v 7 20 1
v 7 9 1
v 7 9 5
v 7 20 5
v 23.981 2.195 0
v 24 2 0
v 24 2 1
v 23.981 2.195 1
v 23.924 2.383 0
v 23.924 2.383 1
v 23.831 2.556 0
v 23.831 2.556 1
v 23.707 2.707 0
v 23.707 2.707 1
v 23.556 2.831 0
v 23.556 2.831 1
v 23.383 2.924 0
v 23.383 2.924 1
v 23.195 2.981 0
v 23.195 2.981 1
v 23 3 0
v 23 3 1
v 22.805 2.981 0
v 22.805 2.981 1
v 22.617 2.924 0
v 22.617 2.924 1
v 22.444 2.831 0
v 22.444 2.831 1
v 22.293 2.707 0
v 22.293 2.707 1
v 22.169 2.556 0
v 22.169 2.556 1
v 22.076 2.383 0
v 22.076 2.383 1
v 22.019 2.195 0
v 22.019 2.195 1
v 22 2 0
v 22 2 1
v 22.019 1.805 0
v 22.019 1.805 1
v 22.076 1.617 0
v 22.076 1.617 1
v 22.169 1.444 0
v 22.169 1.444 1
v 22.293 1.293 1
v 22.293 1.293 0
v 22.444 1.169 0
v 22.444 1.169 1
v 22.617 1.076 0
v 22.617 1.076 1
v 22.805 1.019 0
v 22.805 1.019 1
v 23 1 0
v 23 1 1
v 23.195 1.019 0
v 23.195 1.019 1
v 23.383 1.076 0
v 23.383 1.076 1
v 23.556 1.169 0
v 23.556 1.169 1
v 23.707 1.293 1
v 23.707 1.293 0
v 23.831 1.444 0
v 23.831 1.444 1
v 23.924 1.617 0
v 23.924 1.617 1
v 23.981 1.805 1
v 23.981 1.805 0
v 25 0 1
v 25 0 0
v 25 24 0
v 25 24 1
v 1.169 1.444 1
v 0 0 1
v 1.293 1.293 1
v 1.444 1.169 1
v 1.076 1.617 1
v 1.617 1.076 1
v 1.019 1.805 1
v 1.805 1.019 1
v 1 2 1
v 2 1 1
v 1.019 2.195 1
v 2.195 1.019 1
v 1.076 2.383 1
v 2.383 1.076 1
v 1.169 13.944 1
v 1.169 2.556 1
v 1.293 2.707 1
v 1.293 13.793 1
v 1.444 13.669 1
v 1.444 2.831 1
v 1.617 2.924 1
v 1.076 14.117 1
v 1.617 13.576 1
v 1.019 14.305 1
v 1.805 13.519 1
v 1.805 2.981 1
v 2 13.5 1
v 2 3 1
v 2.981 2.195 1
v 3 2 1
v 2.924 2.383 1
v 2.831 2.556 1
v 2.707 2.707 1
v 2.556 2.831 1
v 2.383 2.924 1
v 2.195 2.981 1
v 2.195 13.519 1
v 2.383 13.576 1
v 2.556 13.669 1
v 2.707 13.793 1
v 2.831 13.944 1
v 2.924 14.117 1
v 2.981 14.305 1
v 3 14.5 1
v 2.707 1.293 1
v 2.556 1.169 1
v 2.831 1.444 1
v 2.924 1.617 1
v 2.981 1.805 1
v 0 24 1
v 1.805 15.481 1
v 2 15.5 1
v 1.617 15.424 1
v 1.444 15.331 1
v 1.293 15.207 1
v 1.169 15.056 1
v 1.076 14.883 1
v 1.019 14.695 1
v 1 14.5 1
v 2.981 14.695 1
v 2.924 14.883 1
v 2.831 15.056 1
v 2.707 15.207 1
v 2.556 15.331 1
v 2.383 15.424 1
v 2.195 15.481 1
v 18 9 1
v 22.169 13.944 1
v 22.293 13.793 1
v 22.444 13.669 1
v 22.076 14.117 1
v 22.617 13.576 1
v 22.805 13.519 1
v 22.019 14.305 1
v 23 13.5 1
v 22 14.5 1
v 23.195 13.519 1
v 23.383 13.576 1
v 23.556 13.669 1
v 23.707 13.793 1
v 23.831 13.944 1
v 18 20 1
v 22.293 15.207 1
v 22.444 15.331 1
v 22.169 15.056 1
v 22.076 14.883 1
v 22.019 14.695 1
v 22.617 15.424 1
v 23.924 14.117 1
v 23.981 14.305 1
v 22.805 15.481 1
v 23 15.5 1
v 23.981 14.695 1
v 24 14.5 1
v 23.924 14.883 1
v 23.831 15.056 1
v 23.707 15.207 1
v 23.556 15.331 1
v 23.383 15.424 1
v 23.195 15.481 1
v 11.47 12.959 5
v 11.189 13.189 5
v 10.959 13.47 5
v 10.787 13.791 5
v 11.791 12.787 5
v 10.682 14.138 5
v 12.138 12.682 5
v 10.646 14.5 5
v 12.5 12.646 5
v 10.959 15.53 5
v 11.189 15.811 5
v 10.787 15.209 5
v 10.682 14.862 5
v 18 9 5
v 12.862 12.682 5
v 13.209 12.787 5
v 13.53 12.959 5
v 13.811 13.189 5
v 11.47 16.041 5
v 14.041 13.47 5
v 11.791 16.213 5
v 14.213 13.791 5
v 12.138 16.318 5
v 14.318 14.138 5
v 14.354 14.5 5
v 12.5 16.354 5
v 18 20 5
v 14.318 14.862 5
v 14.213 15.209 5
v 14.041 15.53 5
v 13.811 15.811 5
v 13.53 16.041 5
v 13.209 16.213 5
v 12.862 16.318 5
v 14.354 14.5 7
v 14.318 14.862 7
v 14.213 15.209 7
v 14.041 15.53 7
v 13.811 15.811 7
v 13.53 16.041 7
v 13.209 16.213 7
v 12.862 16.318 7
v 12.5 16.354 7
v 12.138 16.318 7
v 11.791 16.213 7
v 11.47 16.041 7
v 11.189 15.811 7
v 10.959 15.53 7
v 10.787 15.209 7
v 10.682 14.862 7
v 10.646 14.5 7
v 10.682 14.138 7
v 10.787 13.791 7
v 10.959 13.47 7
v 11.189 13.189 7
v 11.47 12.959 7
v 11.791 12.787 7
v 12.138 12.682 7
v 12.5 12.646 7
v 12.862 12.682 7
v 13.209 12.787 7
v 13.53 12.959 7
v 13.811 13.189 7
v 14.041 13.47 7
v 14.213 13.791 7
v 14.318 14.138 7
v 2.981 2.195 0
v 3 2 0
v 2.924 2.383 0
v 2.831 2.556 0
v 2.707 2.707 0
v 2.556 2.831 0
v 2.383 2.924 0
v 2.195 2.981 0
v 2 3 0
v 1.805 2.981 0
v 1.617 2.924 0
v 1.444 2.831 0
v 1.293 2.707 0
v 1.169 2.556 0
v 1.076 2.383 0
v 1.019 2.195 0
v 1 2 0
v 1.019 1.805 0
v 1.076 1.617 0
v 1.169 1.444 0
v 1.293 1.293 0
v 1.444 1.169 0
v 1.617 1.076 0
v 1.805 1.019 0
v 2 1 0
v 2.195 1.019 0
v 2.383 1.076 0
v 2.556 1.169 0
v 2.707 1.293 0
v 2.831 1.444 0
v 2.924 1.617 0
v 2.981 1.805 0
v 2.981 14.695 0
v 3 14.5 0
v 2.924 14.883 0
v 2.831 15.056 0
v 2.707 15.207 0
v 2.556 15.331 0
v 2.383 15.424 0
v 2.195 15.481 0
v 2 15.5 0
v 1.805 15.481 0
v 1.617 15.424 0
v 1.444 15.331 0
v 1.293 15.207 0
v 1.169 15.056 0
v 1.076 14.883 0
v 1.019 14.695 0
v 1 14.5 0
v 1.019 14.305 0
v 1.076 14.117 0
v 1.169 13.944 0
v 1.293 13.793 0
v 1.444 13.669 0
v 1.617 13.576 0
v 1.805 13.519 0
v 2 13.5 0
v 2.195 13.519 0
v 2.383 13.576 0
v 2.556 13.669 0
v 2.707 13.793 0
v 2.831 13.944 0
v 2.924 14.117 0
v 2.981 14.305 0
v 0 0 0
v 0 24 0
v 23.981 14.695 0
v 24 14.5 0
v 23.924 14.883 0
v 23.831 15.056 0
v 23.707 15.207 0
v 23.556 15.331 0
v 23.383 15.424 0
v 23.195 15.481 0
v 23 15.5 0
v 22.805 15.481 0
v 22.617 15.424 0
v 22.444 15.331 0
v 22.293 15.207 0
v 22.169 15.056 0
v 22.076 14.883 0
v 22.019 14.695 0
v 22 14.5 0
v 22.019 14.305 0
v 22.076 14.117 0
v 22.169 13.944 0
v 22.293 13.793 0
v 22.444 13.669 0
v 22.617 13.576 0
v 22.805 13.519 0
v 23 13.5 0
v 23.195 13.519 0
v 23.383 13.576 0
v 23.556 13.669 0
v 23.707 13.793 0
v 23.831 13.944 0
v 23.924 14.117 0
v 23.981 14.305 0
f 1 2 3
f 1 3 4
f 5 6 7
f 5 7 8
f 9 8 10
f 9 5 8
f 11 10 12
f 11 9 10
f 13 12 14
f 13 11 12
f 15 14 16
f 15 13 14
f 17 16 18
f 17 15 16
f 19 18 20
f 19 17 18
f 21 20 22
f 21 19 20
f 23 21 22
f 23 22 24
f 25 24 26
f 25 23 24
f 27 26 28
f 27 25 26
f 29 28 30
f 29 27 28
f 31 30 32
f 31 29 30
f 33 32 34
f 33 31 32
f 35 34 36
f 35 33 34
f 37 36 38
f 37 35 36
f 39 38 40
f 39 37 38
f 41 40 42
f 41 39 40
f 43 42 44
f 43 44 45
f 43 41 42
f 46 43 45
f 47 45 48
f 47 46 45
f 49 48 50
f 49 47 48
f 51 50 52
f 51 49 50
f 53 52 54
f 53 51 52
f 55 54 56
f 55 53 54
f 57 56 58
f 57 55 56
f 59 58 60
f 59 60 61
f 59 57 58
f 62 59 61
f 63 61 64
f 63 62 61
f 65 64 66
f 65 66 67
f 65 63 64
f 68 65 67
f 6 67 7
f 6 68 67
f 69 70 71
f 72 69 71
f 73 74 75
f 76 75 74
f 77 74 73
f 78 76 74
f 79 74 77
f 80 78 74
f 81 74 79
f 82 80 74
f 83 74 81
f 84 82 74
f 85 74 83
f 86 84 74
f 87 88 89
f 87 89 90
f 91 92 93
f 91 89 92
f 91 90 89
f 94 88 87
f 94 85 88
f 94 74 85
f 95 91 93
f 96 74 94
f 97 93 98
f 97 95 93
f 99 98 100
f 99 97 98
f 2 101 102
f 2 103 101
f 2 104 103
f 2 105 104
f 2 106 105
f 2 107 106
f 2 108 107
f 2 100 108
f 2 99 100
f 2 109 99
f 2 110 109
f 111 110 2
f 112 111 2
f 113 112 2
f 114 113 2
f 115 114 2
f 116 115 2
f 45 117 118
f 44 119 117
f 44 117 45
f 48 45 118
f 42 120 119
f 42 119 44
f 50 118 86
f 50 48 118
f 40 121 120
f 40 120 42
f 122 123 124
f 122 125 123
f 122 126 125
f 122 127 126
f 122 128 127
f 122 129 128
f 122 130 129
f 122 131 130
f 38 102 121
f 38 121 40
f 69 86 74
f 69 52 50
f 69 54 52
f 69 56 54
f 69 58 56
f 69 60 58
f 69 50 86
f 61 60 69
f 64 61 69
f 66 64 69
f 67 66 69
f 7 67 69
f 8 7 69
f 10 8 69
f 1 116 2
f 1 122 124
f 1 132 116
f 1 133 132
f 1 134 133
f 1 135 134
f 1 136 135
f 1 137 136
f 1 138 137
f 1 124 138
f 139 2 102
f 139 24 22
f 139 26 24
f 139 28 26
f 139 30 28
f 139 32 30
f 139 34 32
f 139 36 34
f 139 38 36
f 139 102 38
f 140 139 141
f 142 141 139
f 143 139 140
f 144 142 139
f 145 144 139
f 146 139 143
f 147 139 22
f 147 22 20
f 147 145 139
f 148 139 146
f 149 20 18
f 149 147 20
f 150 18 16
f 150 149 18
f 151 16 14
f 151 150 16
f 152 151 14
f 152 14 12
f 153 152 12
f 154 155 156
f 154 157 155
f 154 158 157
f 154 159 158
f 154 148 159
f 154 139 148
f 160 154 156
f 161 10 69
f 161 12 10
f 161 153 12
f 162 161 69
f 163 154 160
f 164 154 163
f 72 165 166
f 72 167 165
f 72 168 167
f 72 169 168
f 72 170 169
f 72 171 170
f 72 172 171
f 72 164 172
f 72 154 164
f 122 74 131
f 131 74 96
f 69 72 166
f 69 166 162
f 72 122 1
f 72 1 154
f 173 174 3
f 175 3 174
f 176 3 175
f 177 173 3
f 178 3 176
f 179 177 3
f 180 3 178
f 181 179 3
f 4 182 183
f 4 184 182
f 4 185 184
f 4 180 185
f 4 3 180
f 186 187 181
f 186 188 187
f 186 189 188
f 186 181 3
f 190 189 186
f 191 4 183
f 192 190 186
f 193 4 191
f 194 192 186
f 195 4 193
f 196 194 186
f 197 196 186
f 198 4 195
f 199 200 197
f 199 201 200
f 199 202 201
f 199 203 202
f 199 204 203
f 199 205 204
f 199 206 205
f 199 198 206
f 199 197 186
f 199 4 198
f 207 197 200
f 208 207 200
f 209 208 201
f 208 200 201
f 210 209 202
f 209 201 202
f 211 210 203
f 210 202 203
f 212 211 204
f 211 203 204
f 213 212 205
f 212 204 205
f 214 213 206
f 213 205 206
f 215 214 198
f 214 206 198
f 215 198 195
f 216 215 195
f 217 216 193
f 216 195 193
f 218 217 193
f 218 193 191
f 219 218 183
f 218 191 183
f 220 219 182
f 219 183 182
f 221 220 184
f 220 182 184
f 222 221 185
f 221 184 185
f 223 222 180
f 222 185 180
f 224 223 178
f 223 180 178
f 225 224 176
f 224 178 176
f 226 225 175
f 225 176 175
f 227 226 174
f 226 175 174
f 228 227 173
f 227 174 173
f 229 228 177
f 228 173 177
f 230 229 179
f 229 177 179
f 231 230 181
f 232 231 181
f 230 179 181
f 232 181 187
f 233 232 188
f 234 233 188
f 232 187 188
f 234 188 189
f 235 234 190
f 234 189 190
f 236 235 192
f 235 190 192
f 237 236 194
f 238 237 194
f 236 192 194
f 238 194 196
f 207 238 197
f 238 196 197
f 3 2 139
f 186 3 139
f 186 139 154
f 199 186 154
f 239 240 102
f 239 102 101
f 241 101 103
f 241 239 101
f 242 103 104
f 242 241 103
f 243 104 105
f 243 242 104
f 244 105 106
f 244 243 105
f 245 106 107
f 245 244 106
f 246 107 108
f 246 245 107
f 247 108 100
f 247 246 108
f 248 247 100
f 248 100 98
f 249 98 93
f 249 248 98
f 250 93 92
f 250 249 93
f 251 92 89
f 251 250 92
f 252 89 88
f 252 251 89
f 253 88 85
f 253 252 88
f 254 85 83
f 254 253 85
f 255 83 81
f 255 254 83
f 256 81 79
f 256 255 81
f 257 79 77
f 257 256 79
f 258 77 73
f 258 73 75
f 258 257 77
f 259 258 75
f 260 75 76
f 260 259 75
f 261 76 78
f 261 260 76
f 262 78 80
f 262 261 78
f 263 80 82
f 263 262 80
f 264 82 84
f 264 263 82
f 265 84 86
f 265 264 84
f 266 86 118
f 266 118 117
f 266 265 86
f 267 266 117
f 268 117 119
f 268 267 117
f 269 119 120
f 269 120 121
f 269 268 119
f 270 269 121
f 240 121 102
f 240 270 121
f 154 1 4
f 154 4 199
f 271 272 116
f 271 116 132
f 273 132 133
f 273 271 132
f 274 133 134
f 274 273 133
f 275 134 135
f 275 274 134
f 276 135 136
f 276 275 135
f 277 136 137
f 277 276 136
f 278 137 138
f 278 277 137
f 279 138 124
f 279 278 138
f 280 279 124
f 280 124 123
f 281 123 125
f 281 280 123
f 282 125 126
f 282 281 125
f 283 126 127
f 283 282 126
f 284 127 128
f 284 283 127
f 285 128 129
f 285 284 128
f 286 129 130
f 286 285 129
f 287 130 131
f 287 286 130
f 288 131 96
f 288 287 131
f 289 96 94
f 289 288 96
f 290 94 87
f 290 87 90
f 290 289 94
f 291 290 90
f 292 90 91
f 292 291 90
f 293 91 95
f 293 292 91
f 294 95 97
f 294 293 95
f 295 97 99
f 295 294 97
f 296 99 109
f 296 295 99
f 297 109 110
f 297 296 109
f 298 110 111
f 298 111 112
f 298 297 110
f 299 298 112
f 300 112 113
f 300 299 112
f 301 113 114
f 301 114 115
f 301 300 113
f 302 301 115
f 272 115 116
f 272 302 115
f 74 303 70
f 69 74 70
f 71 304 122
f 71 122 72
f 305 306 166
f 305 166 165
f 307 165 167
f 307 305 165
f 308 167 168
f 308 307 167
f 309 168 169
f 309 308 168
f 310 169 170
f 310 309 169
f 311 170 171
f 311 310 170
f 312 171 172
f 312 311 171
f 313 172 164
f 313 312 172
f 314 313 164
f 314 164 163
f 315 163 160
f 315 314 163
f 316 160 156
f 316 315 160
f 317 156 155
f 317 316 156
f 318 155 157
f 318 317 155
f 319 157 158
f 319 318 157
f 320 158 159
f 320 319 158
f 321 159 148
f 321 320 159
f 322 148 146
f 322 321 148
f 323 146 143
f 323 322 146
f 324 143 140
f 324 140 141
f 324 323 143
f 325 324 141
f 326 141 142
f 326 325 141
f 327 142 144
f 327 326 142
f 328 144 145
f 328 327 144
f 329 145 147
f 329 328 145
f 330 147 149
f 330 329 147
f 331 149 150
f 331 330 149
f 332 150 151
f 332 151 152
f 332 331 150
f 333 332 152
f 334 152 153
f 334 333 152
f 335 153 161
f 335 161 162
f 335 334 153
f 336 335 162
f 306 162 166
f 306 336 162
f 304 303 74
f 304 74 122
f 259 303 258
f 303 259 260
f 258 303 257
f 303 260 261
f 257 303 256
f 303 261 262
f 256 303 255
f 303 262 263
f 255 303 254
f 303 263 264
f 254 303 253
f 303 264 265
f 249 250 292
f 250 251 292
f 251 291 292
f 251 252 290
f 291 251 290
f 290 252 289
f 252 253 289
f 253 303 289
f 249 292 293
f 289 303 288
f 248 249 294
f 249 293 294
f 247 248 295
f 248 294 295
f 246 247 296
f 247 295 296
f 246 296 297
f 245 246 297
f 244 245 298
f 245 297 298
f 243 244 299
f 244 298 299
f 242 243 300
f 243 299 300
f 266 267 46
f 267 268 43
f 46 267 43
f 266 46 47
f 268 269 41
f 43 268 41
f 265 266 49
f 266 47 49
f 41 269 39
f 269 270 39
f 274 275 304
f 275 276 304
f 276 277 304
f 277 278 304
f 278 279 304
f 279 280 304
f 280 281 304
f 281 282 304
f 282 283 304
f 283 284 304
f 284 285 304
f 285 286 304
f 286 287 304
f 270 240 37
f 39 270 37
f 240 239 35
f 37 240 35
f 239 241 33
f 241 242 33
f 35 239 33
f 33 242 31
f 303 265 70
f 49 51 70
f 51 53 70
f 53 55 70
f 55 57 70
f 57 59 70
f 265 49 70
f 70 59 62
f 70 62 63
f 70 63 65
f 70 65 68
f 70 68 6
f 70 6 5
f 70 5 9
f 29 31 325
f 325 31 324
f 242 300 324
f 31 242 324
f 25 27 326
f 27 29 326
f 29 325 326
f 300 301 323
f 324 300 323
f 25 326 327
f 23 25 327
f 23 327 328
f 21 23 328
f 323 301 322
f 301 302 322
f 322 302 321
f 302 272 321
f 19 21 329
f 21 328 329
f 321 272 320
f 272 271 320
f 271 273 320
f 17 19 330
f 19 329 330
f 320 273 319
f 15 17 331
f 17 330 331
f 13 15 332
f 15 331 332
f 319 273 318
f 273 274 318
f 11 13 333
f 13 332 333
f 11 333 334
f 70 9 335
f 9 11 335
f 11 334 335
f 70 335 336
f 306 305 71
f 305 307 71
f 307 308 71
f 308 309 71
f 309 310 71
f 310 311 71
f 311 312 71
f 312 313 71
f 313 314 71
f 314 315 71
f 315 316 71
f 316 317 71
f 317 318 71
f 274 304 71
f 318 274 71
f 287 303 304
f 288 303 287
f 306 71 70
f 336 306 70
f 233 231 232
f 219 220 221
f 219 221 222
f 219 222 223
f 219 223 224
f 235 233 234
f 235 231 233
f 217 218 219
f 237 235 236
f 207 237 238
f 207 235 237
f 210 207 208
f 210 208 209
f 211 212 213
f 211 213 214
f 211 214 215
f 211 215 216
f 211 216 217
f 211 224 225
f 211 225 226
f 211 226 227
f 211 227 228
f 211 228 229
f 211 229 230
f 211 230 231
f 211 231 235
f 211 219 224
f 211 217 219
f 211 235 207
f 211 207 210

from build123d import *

# Parameters (mm, degrees)
SKETCH1_W           = 25
SKETCH1_H           = 24
SKETCH1_R           = 1
BOSS_EXTRUDE1_DEPTH = 1
SKETCH2_W           = 11
SKETCH2_H           = 11
BOSS_EXTRUDE2_DEPTH = 4
SKETCH3_R           = 1.853795749
BOSS_EXTRUDE3_DEPTH = 2


with BuildPart() as part:
    # Sketch1 → Boss-Extrude1 (new body)
    with BuildSketch(Plane.XY):
        with Locations((12.5, 12)):
            Rectangle(SKETCH1_W, SKETCH1_H)
        with Locations((2, 2)):
            Circle(SKETCH1_R, mode=Mode.SUBTRACT)
        with Locations((23, 2)):
            Circle(SKETCH1_R, mode=Mode.SUBTRACT)
        with Locations((2, 14.5)):
            Circle(SKETCH1_R, mode=Mode.SUBTRACT)
        with Locations((23, 14.5)):
            Circle(SKETCH1_R, mode=Mode.SUBTRACT)
    extrude(amount=BOSS_EXTRUDE1_DEPTH)

    # Sketch2 → Boss-Extrude2 (add)
    with BuildSketch(Plane.XY.offset(1)):
        with Locations((12.5, 14.5)):
            Rectangle(SKETCH2_W, SKETCH2_H)
    extrude(amount=BOSS_EXTRUDE2_DEPTH)

    # Sketch3 → Boss-Extrude3 (add)
    with BuildSketch(Plane.XY.offset(5)):
        with Locations((12.5, 14.5)):
            Circle(SKETCH3_R)
    extrude(amount=BOSS_EXTRUDE3_DEPTH)


solid = part.part
